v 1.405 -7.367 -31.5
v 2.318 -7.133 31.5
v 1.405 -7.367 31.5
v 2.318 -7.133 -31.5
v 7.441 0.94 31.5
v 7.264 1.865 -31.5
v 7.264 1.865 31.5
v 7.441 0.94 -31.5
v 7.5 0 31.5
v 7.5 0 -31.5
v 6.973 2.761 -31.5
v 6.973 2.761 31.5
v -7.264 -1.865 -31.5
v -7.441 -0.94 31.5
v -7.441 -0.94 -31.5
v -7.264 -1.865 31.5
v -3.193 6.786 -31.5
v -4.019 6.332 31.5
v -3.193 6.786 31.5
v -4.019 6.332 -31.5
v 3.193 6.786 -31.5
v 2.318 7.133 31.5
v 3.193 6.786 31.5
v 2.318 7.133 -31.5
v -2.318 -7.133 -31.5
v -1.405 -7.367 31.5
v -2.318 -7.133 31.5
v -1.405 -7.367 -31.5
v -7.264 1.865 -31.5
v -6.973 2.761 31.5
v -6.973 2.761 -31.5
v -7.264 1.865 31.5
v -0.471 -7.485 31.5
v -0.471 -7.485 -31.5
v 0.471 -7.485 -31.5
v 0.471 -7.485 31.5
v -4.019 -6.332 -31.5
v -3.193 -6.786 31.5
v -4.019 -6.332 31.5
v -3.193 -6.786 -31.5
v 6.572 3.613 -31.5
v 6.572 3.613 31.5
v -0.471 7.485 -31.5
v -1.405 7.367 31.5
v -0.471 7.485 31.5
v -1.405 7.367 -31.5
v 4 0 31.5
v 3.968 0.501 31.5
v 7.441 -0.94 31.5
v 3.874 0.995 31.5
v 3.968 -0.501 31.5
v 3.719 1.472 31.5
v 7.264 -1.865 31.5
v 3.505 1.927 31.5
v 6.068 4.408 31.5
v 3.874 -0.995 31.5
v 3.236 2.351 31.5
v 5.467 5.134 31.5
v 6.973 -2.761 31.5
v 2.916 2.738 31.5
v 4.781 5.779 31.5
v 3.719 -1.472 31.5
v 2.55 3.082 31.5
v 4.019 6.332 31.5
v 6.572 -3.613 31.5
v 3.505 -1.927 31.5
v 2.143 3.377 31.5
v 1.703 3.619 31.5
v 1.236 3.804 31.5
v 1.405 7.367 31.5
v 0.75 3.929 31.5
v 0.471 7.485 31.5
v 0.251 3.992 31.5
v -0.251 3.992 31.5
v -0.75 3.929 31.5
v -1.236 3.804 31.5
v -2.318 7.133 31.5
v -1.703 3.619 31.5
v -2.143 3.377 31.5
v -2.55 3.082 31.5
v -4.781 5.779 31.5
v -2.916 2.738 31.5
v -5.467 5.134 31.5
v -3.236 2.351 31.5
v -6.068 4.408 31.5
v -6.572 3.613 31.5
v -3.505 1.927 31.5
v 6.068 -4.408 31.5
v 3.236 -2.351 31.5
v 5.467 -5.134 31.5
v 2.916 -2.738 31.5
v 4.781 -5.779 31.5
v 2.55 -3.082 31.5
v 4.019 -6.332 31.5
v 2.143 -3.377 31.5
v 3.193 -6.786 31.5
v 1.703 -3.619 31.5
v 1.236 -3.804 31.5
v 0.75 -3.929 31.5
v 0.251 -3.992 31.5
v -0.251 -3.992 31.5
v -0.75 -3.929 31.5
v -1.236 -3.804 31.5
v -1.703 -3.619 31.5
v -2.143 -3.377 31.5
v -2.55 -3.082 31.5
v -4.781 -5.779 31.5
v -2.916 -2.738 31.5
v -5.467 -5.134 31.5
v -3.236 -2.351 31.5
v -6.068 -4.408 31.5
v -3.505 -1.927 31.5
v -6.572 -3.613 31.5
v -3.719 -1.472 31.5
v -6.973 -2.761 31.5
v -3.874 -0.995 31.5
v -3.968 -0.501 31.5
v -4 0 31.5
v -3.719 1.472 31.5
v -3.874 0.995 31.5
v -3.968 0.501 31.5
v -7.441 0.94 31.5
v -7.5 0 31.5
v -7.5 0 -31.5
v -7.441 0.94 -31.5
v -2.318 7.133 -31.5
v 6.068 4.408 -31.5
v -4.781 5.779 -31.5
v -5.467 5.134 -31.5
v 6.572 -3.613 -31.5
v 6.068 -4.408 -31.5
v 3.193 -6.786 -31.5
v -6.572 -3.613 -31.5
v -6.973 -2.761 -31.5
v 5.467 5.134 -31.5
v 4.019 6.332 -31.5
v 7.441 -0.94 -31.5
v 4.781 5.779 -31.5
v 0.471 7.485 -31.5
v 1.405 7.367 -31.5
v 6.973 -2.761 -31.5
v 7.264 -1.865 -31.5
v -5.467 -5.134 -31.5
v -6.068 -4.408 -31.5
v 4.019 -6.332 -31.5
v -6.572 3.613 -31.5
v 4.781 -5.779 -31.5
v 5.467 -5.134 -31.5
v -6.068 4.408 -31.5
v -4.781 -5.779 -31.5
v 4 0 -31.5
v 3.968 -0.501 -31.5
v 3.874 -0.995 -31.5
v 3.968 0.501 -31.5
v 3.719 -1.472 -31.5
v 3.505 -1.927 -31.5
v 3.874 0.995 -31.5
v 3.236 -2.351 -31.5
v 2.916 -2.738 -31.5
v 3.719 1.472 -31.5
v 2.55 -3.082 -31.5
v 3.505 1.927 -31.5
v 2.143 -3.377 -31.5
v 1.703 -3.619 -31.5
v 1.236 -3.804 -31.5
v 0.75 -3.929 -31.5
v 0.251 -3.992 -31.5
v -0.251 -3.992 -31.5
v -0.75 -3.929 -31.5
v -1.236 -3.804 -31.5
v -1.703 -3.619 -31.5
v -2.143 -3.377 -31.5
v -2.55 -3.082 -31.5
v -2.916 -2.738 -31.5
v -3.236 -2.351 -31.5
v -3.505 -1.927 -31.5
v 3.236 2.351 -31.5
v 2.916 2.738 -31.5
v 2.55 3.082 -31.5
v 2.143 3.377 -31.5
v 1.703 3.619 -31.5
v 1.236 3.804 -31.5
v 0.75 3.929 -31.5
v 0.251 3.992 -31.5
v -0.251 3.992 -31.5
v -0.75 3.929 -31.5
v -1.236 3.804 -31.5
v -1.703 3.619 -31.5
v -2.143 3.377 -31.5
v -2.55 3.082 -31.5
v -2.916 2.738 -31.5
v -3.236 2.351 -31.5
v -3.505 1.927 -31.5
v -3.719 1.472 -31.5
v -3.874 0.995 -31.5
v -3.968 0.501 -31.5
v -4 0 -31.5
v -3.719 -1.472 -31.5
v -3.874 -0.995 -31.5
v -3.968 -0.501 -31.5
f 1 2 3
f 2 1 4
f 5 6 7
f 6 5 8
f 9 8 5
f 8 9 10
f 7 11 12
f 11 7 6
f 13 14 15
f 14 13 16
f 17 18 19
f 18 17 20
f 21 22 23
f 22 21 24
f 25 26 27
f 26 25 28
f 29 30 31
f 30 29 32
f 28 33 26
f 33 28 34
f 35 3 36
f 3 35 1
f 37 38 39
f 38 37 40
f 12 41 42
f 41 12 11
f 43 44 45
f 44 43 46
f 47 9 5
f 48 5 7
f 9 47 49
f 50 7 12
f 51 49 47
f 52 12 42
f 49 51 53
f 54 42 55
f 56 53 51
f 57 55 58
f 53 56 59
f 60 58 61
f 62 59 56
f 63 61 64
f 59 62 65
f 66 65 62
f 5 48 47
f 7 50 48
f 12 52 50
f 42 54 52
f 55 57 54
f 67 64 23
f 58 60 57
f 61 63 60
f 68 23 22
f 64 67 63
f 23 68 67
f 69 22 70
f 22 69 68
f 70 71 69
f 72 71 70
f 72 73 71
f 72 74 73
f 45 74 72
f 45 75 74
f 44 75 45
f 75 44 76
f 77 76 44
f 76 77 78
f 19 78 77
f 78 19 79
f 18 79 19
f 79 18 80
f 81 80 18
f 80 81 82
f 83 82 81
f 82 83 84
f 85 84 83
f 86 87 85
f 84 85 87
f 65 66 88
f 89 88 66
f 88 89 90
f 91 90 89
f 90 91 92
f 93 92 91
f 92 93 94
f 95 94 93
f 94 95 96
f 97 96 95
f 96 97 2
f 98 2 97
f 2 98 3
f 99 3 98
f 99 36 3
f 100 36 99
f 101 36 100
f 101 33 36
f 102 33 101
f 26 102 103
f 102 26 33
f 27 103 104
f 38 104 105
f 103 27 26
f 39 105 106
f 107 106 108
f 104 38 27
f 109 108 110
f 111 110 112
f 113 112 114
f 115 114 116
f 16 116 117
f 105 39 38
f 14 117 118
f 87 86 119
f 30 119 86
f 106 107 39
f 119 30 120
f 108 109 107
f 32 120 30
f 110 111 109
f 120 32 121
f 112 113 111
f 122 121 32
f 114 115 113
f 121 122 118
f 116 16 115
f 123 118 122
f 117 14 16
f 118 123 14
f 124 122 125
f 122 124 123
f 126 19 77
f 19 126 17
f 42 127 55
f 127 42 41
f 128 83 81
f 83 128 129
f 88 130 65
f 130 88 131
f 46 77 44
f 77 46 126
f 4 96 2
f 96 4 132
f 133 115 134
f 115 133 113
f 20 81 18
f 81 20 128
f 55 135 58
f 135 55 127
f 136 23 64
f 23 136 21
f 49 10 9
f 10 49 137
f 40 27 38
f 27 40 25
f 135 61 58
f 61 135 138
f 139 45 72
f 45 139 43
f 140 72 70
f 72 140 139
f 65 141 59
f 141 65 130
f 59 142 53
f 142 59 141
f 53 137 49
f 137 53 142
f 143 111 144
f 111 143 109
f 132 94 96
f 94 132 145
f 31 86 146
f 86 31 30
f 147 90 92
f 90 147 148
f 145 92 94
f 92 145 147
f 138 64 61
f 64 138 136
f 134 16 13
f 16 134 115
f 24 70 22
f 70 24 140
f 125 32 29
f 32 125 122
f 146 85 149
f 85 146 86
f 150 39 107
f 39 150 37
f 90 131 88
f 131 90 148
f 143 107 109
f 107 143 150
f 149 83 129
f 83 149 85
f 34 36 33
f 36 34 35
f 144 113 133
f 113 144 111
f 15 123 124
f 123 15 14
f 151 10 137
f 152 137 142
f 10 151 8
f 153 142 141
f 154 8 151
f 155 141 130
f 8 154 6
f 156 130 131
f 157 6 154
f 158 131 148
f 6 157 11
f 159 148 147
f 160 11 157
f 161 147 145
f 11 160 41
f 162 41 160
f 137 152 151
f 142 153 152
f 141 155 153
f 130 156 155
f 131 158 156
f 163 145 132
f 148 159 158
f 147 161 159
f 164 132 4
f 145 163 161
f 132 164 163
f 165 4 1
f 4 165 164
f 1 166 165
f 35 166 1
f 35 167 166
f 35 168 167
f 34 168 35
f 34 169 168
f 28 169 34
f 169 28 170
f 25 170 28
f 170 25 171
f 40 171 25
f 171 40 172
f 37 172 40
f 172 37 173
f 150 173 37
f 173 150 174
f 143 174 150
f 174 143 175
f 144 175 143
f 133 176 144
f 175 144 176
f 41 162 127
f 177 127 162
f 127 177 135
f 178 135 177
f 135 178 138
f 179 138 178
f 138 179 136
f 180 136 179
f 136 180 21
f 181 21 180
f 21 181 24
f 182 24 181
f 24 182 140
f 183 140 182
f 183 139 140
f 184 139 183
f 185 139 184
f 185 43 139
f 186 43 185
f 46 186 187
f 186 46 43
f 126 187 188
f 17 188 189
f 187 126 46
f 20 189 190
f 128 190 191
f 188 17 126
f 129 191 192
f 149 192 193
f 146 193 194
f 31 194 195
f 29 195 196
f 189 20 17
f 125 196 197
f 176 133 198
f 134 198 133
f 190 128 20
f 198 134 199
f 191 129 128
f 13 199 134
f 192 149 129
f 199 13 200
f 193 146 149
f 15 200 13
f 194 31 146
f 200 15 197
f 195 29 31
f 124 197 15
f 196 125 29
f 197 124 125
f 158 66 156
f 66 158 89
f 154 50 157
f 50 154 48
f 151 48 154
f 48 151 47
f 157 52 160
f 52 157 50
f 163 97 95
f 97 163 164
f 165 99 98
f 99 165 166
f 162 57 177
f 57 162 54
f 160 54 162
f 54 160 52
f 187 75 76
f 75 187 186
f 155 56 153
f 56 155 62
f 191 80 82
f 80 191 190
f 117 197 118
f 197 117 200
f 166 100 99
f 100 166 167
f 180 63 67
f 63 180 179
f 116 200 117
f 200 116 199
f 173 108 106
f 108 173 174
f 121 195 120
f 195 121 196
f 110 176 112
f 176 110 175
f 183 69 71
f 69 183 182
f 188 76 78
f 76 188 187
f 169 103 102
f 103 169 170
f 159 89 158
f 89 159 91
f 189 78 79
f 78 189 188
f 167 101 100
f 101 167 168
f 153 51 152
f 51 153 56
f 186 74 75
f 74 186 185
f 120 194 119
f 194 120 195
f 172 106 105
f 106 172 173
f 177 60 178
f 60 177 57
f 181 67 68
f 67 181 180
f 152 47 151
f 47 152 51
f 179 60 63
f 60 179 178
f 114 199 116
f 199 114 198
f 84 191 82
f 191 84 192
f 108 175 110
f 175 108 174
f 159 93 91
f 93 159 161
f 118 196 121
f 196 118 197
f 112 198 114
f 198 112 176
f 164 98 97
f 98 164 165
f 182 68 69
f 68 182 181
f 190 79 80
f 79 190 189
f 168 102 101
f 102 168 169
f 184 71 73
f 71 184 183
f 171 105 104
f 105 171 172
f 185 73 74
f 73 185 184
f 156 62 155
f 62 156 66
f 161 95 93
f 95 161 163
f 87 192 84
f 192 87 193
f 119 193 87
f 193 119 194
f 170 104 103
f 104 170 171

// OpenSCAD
$fn = 50;


difference() {
	union() {
		translate(v = [0, 0, -31.5000000000]) {
			cylinder(h = 63, r = 7.5000000000);
		}
	}
	union() {
		translate(v = [0, 0, -100.0000000000]) {
			cylinder(h = 200, r = 4.0000000000);
		}
	}
}
